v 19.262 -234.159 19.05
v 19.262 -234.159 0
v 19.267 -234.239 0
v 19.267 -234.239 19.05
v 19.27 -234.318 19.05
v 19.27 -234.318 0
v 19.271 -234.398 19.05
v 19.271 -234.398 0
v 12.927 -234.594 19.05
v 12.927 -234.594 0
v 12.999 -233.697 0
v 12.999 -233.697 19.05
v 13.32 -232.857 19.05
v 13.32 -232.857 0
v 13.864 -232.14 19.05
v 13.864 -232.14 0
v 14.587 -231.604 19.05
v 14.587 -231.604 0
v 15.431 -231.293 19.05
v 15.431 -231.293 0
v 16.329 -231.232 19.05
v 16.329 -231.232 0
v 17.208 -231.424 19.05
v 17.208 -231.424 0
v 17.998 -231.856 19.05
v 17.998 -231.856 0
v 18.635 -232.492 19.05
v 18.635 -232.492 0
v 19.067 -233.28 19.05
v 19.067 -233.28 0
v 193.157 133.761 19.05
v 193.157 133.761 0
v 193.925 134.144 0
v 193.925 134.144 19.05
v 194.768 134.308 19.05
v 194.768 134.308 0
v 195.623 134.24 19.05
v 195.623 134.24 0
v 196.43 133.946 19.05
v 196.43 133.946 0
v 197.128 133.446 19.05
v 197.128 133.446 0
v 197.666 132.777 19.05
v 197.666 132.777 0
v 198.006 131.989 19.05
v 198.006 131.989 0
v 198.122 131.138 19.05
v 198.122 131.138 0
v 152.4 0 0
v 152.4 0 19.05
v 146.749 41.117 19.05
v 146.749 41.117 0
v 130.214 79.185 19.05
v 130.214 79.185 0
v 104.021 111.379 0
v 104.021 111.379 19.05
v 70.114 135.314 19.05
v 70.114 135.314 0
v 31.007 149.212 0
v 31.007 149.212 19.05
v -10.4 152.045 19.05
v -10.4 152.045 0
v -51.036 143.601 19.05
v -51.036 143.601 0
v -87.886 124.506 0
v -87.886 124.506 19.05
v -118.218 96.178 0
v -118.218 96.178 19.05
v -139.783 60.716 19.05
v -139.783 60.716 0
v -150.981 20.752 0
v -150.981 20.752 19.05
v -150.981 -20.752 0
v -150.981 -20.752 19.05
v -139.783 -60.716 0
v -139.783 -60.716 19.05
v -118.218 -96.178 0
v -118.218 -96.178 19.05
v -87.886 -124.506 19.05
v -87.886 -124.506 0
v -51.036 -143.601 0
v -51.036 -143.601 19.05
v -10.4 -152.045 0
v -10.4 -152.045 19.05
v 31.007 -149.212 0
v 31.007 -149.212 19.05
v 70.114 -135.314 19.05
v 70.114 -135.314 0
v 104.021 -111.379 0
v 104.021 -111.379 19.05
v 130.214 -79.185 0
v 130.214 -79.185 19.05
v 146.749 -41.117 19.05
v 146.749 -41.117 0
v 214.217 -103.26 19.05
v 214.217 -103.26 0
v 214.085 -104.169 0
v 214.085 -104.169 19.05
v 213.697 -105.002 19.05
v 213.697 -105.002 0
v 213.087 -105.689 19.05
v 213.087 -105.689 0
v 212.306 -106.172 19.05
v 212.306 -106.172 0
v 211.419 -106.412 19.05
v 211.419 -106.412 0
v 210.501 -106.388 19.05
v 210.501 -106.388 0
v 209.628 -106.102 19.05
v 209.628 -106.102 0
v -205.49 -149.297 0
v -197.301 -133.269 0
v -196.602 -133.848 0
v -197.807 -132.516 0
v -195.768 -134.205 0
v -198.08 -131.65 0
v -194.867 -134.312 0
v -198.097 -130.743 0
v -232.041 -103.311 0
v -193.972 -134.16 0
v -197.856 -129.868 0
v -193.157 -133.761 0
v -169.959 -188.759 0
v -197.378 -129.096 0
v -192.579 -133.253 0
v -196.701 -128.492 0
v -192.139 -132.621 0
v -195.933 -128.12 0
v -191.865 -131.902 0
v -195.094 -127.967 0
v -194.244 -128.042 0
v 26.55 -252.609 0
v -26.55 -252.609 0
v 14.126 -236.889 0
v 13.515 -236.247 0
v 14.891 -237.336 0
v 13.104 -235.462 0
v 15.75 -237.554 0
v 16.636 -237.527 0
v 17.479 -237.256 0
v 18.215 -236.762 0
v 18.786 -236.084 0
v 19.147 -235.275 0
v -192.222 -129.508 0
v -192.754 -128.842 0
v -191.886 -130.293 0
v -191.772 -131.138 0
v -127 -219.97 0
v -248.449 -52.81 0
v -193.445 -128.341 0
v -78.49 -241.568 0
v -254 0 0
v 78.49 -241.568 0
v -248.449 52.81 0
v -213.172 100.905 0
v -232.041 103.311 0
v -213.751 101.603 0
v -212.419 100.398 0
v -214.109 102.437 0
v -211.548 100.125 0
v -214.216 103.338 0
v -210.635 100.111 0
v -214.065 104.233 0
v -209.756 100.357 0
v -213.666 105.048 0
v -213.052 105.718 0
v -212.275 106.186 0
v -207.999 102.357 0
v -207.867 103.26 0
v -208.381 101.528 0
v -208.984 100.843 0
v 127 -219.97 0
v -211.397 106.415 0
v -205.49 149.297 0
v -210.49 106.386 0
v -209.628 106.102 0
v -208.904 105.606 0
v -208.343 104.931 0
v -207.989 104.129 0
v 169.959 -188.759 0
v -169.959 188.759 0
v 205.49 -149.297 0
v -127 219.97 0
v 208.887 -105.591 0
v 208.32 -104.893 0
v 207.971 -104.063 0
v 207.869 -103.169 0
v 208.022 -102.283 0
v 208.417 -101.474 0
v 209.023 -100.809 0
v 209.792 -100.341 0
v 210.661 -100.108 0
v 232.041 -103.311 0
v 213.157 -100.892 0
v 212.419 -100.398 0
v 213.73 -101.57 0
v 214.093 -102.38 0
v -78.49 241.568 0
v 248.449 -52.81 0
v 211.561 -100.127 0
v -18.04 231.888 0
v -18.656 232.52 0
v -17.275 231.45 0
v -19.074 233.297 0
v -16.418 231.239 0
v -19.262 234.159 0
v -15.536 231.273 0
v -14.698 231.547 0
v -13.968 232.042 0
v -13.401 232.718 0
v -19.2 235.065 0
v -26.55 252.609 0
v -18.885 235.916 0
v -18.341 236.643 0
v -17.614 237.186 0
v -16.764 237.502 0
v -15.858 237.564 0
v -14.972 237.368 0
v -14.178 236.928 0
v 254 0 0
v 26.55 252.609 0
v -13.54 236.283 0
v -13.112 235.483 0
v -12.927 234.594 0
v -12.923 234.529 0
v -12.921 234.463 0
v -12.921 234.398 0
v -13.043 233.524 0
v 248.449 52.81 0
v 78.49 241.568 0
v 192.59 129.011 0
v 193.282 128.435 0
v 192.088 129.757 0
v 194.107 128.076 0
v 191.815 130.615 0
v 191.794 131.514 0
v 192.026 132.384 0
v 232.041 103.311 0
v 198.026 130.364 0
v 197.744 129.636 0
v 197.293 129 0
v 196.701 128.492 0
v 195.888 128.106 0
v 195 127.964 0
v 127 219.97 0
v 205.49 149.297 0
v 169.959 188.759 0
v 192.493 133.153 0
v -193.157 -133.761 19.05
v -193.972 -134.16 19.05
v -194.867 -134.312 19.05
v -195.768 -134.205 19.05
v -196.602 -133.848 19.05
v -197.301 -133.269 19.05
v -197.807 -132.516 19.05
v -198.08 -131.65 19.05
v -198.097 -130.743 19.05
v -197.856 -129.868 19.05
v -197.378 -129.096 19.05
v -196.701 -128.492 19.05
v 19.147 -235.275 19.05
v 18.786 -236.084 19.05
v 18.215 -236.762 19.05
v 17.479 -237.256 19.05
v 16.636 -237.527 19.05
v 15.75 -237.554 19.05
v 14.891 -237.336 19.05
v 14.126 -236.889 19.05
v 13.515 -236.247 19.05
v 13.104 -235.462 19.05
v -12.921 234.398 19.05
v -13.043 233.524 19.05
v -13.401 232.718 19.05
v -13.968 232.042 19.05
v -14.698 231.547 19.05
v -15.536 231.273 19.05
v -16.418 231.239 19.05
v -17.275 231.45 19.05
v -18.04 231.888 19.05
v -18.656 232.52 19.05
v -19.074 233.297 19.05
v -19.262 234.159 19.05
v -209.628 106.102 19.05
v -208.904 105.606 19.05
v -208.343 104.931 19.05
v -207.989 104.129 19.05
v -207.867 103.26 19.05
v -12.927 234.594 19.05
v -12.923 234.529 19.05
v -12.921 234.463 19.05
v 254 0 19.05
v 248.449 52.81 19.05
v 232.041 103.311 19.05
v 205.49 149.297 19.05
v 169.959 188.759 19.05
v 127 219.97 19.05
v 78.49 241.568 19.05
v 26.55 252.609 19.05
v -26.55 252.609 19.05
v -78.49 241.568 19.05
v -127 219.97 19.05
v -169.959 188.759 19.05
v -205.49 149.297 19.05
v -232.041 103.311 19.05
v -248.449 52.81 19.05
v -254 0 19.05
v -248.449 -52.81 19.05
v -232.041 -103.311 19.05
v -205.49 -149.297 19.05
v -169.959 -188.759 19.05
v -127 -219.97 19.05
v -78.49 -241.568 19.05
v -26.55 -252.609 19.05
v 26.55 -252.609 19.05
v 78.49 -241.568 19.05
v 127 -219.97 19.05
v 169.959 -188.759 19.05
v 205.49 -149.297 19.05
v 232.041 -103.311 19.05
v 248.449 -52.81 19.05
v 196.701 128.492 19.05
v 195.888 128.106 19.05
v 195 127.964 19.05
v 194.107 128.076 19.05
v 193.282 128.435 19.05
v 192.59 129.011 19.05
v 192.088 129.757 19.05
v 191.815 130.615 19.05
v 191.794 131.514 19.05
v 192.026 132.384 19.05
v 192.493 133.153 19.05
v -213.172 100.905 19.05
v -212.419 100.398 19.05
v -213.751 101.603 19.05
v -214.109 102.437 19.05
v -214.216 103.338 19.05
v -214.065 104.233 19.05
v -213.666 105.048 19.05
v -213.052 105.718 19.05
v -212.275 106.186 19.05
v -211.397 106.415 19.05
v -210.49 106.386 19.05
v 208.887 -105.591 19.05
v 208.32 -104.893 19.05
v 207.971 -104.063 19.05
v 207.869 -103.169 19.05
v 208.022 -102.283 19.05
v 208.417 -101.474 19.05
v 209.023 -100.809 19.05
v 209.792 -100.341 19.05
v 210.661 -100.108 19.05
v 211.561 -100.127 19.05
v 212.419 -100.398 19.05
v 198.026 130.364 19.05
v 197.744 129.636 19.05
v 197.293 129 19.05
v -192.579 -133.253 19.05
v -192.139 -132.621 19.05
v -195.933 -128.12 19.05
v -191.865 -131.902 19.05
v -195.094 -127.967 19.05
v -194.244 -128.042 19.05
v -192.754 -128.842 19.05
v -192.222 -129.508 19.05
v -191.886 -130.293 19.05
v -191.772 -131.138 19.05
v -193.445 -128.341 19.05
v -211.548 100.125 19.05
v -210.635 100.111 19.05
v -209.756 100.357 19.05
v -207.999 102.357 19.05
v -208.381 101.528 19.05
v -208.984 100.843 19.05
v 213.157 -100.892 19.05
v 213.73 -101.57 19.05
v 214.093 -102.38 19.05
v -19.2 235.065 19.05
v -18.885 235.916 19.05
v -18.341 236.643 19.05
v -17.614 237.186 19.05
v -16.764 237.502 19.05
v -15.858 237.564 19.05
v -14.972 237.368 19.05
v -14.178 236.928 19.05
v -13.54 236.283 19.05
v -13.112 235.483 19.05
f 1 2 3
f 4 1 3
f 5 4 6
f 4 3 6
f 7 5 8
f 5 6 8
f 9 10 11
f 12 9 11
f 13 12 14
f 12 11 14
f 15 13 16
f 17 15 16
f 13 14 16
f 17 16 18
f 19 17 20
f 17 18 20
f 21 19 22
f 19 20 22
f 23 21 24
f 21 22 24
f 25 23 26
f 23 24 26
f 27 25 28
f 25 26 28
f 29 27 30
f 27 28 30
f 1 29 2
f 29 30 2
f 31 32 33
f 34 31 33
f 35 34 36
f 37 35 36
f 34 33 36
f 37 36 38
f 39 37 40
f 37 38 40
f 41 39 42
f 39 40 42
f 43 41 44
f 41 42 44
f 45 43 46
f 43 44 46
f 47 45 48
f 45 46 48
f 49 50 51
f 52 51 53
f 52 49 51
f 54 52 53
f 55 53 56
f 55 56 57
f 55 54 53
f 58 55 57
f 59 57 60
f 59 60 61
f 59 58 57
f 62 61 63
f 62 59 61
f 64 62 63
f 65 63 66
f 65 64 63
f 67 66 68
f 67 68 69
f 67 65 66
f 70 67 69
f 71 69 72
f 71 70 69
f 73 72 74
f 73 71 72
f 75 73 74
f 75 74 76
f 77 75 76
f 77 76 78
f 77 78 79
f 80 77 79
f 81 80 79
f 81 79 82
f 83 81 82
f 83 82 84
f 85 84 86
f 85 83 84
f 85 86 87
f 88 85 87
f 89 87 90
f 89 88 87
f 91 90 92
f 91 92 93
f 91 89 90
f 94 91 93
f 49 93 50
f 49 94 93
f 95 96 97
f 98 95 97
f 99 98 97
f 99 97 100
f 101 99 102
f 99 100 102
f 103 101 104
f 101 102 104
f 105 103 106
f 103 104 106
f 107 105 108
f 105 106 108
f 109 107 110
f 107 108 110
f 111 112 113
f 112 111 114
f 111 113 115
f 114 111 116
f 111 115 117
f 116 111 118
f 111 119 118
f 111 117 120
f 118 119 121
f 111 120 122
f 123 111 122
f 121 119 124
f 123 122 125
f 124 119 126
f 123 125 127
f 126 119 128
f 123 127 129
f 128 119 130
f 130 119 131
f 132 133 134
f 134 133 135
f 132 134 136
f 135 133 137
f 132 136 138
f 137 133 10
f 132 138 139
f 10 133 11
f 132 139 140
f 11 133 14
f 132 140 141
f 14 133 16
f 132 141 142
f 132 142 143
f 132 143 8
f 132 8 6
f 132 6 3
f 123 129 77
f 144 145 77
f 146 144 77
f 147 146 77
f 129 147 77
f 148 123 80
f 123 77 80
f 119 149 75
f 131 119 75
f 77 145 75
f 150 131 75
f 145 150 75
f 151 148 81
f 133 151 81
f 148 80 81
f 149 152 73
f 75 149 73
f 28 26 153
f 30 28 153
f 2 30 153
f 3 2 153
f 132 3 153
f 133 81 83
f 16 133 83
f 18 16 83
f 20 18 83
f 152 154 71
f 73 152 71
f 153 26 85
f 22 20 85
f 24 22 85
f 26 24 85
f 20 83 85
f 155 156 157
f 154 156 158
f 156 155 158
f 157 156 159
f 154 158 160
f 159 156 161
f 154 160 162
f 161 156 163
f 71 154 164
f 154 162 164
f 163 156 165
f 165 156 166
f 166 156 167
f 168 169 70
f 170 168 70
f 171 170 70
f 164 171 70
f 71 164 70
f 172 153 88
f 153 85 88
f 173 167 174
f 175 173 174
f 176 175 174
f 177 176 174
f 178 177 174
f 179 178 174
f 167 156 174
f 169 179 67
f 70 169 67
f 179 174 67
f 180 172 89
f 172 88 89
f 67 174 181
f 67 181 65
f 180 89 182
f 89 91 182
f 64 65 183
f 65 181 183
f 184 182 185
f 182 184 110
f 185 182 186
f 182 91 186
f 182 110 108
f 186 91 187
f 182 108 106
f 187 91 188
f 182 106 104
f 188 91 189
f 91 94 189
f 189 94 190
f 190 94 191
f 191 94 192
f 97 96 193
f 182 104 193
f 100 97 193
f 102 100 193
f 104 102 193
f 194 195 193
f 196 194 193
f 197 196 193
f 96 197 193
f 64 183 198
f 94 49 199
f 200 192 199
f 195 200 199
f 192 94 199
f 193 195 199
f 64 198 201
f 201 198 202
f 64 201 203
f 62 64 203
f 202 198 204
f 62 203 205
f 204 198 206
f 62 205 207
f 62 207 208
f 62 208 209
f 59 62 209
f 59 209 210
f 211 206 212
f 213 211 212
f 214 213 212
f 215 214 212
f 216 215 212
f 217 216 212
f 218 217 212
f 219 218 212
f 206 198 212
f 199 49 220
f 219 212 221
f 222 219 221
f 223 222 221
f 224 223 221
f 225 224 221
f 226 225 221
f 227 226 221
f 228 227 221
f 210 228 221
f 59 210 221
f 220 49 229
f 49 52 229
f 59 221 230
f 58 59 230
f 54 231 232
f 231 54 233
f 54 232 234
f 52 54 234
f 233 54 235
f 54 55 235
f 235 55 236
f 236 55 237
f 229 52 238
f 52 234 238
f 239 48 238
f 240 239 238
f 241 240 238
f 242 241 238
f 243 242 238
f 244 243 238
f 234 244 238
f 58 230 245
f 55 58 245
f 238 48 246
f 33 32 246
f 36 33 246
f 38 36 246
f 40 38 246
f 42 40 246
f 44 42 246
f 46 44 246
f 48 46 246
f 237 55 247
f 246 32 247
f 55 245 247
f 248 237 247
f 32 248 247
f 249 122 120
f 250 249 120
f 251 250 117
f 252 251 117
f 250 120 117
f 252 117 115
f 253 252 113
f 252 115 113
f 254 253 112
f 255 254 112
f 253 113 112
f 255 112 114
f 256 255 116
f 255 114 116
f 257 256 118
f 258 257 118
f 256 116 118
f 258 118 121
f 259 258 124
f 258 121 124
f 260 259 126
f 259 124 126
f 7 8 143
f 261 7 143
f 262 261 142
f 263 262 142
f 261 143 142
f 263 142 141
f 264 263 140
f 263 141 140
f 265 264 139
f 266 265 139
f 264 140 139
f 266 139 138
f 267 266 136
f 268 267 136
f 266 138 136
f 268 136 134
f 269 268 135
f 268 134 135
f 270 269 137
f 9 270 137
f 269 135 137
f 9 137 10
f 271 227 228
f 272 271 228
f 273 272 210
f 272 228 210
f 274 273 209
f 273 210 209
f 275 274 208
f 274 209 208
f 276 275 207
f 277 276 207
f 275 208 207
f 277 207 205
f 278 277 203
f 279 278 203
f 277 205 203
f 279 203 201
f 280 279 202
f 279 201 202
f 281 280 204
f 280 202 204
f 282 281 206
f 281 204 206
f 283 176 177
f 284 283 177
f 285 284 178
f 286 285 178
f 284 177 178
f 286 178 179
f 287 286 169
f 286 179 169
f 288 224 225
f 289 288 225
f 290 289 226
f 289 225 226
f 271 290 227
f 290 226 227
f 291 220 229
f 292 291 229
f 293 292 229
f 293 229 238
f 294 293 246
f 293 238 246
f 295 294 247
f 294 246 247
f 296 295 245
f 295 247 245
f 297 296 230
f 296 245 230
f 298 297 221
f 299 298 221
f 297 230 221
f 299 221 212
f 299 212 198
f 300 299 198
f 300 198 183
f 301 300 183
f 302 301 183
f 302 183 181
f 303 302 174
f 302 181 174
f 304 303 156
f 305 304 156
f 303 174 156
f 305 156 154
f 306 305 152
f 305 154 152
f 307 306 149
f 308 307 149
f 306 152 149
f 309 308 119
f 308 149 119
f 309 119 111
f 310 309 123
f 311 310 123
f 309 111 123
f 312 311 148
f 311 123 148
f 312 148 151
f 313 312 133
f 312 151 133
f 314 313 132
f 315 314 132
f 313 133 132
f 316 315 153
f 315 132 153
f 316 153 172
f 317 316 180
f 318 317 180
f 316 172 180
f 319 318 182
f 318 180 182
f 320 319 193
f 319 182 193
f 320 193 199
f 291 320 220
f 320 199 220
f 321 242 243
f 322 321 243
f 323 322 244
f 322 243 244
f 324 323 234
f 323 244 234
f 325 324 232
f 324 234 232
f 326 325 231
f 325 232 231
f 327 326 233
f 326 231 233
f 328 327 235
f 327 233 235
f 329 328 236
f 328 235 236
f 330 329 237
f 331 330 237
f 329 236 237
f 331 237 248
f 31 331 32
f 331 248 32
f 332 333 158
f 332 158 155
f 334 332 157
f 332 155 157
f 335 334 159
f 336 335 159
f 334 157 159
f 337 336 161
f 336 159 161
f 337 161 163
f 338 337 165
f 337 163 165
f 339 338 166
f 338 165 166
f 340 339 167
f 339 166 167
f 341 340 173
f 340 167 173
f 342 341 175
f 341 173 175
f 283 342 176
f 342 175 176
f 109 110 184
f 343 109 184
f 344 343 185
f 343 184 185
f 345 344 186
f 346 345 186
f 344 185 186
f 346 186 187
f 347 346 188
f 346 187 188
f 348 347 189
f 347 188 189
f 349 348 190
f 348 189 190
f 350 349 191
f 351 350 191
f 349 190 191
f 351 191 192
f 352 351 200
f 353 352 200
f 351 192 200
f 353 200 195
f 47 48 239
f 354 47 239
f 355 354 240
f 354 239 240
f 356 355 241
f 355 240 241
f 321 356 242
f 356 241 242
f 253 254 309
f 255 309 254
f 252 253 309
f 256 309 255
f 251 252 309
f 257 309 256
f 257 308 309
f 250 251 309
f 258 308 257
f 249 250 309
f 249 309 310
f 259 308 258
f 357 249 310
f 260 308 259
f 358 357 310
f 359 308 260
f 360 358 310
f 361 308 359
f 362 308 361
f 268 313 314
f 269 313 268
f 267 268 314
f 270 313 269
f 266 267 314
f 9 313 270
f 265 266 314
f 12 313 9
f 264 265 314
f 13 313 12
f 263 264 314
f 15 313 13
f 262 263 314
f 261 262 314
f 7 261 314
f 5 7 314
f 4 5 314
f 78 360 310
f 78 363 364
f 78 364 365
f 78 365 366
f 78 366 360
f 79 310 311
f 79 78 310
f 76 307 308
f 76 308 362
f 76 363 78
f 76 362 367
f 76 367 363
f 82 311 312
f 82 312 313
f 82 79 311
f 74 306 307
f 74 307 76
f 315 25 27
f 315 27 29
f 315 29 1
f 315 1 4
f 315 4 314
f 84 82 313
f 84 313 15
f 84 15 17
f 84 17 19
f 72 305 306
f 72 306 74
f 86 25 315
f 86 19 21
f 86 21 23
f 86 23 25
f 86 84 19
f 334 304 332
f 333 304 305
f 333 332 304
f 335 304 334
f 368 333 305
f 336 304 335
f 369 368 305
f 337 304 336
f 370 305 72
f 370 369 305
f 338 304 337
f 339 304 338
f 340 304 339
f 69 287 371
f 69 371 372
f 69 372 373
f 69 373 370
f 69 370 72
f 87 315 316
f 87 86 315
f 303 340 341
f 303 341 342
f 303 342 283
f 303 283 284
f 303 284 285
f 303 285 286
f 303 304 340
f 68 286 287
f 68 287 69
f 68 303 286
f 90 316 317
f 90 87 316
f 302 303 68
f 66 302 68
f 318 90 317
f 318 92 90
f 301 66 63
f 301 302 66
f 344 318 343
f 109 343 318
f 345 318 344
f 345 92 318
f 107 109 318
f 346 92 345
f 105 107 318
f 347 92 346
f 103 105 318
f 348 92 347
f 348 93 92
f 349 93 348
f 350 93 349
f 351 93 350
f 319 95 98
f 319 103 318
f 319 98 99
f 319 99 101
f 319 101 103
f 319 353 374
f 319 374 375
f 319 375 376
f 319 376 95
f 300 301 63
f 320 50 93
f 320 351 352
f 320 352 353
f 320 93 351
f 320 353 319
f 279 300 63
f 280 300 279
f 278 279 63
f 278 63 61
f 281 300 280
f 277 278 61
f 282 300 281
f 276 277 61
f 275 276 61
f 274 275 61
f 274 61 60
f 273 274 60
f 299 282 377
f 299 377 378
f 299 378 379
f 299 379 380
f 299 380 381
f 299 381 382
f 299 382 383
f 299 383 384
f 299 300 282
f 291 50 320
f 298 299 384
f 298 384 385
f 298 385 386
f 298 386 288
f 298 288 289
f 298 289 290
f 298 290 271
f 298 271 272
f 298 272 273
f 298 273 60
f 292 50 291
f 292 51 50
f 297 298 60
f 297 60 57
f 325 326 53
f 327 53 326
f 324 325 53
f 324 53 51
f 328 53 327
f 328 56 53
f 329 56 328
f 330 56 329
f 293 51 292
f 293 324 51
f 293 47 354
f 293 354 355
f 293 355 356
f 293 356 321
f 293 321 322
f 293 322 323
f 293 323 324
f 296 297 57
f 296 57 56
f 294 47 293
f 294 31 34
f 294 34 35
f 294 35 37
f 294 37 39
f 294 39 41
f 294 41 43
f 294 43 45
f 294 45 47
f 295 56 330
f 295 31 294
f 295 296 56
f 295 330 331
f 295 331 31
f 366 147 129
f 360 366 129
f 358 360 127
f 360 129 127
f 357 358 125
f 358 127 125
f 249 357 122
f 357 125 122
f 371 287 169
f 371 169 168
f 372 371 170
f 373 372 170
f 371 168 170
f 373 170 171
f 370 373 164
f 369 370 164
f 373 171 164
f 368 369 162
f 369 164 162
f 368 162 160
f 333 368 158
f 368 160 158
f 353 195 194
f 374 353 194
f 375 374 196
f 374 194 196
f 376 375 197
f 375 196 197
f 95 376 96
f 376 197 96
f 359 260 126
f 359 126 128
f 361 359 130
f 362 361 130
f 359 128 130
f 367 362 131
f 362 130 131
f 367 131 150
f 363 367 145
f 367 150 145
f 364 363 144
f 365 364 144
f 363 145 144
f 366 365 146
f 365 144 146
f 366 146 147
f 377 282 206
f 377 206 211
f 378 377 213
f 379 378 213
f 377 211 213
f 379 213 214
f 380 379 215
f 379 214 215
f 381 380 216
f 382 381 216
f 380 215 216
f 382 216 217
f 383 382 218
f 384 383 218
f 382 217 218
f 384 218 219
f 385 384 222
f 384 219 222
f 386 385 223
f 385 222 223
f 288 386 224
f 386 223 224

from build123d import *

# Parameters (mm, degrees)
F0_R     = 254
F0_R_2   = 152.4
F1_DEPTH = 19.05


with BuildPart() as f1:
    # F0 (on Top) → F1 (new body)
    with BuildSketch(Plane.XY):
        Circle(F0_R)
        with BuildLine():
            ThreePointArc((196.7011125508, 128.4919251209), (225.1848450649, 67.0319927579), (234.95, 0))
            ThreePointArc((234.95, 0), (229.2479499847, -51.4478369596), (212.4185683948, -100.3984775836))
            ThreePointArc((212.4185683948, -100.3984775836), (213.7303800146, -101.5698688542), (214.2174677682, -103.259766116))
            ThreePointArc((214.2174677682, -103.259766116), (212.7141648851, -105.9590352298), (209.6278276113, -106.1021978612))
            ThreePointArc((209.6278276113, -106.1021978612), (131.1382553066, -194.9468145294), (19.2616521087, -234.1591152572))
            ThreePointArc((19.2616521087, -234.1591152572), (19.2684021583, -234.2784835874), (19.2706532388, -234.3980214226))
            ThreePointArc((19.2706532388, -234.3980214226), (16.1937508526, -237.5715056053), (12.9267150604, -234.5941229821))
            ThreePointArc((12.9267150604, -234.5941229821), (-103.259766116, -211.0424677682), (-193.1569162861, -133.7606376736))
            ThreePointArc((-193.1569162861, -133.7606376736), (-197.5812309419, -132.9103938918), (-196.7011125508, -128.4919251209))
            ThreePointArc((-196.7011125508, -128.4919251209), (-234.3980214226, -16.0956532388), (-212.4185683948, 100.3984775836))
            ThreePointArc((-212.4185683948, 100.3984775836), (-213.8943930083, 104.6551683608), (-209.6278276113, 106.1021978612))
            ThreePointArc((-209.6278276113, 106.1021978612), (-131.1382553066, 194.9468145294), (-19.2616521087, 234.1591152572))
            ThreePointArc((-19.2616521087, 234.1591152572), (-16.3131620664, 237.5655622526), (-12.9267150604, 234.5941229821))
            ThreePointArc((-12.9267150604, 234.5941229821), (103.259766116, 211.0424677682), (193.1569162861, 133.7606376736))
            ThreePointArc((193.1569162861, 133.7606376736), (196.4296661871, 133.9457053883), (198.1218145294, 131.1382553066))
            ThreePointArc((198.1218145294, 131.1382553066), (197.744181257, 129.6364682408), (196.7011125508, 128.4919251209))
        make_face(mode=Mode.SUBTRACT)
        with BuildLine():
            ThreePointArc((212.4185683948, -100.3984775836), (229.2479499847, -51.4478369596), (234.95, 0))
            ThreePointArc((234.95, 0), (225.1848450649, 67.0319927579), (196.7011125508, 128.4919251209))
            ThreePointArc((196.7011125508, 128.4919251209), (192.3123981168, 129.3661167214), (193.1569162861, 133.7606376736))
            ThreePointArc((193.1569162861, 133.7606376736), (103.259766116, 211.0424677682), (-12.9267150604, 234.5941229821))
            ThreePointArc((-12.9267150604, 234.5941229821), (-12.9221690561, 234.4961190364), (-12.9206532388, 234.3980214226))
            ThreePointArc((-12.9206532388, 234.3980214226), (-15.9761154036, 231.2252725031), (-19.2616521087, 234.1591152572))
            ThreePointArc((-19.2616521087, 234.1591152572), (-131.1382553066, 194.9468145294), (-209.6278276113, 106.1021978612))
            ThreePointArc((-209.6278276113, 106.1021978612), (-208.3431986543, 104.931463233), (-207.8674677682, 103.259766116))
            ThreePointArc((-207.8674677682, 103.259766116), (-209.3525705064, 100.5718538695), (-212.4185683948, 100.3984775836))
            ThreePointArc((-212.4185683948, 100.3984775836), (-234.3980214226, -16.0956532388), (-196.7011125508, -128.4919251209))
            ThreePointArc((-196.7011125508, -128.4919251209), (-193.4450274636, -128.3408885789), (-191.7718145294, -131.1382553066))
            ThreePointArc((-191.7718145294, -131.1382553066), (-192.1393644477, -132.6211069643), (-193.1569162861, -133.7606376736))
            ThreePointArc((-193.1569162861, -133.7606376736), (-103.259766116, -211.0424677682), (12.9267150604, -234.5941229821))
            ThreePointArc((12.9267150604, -234.5941229821), (15.8781444113, -231.2304805925), (19.2616521087, -234.1591152572))
            ThreePointArc((19.2616521087, -234.1591152572), (131.1382553066, -194.9468145294), (209.6278276113, -106.1021978612))
            ThreePointArc((209.6278276113, -106.1021978612), (208.190542528, -101.8643638712), (212.4185683948, -100.3984775836))
        make_face()
        Circle(F0_R_2, mode=Mode.SUBTRACT)
    extrude(amount=F1_DEPTH)


solid = f1.part
